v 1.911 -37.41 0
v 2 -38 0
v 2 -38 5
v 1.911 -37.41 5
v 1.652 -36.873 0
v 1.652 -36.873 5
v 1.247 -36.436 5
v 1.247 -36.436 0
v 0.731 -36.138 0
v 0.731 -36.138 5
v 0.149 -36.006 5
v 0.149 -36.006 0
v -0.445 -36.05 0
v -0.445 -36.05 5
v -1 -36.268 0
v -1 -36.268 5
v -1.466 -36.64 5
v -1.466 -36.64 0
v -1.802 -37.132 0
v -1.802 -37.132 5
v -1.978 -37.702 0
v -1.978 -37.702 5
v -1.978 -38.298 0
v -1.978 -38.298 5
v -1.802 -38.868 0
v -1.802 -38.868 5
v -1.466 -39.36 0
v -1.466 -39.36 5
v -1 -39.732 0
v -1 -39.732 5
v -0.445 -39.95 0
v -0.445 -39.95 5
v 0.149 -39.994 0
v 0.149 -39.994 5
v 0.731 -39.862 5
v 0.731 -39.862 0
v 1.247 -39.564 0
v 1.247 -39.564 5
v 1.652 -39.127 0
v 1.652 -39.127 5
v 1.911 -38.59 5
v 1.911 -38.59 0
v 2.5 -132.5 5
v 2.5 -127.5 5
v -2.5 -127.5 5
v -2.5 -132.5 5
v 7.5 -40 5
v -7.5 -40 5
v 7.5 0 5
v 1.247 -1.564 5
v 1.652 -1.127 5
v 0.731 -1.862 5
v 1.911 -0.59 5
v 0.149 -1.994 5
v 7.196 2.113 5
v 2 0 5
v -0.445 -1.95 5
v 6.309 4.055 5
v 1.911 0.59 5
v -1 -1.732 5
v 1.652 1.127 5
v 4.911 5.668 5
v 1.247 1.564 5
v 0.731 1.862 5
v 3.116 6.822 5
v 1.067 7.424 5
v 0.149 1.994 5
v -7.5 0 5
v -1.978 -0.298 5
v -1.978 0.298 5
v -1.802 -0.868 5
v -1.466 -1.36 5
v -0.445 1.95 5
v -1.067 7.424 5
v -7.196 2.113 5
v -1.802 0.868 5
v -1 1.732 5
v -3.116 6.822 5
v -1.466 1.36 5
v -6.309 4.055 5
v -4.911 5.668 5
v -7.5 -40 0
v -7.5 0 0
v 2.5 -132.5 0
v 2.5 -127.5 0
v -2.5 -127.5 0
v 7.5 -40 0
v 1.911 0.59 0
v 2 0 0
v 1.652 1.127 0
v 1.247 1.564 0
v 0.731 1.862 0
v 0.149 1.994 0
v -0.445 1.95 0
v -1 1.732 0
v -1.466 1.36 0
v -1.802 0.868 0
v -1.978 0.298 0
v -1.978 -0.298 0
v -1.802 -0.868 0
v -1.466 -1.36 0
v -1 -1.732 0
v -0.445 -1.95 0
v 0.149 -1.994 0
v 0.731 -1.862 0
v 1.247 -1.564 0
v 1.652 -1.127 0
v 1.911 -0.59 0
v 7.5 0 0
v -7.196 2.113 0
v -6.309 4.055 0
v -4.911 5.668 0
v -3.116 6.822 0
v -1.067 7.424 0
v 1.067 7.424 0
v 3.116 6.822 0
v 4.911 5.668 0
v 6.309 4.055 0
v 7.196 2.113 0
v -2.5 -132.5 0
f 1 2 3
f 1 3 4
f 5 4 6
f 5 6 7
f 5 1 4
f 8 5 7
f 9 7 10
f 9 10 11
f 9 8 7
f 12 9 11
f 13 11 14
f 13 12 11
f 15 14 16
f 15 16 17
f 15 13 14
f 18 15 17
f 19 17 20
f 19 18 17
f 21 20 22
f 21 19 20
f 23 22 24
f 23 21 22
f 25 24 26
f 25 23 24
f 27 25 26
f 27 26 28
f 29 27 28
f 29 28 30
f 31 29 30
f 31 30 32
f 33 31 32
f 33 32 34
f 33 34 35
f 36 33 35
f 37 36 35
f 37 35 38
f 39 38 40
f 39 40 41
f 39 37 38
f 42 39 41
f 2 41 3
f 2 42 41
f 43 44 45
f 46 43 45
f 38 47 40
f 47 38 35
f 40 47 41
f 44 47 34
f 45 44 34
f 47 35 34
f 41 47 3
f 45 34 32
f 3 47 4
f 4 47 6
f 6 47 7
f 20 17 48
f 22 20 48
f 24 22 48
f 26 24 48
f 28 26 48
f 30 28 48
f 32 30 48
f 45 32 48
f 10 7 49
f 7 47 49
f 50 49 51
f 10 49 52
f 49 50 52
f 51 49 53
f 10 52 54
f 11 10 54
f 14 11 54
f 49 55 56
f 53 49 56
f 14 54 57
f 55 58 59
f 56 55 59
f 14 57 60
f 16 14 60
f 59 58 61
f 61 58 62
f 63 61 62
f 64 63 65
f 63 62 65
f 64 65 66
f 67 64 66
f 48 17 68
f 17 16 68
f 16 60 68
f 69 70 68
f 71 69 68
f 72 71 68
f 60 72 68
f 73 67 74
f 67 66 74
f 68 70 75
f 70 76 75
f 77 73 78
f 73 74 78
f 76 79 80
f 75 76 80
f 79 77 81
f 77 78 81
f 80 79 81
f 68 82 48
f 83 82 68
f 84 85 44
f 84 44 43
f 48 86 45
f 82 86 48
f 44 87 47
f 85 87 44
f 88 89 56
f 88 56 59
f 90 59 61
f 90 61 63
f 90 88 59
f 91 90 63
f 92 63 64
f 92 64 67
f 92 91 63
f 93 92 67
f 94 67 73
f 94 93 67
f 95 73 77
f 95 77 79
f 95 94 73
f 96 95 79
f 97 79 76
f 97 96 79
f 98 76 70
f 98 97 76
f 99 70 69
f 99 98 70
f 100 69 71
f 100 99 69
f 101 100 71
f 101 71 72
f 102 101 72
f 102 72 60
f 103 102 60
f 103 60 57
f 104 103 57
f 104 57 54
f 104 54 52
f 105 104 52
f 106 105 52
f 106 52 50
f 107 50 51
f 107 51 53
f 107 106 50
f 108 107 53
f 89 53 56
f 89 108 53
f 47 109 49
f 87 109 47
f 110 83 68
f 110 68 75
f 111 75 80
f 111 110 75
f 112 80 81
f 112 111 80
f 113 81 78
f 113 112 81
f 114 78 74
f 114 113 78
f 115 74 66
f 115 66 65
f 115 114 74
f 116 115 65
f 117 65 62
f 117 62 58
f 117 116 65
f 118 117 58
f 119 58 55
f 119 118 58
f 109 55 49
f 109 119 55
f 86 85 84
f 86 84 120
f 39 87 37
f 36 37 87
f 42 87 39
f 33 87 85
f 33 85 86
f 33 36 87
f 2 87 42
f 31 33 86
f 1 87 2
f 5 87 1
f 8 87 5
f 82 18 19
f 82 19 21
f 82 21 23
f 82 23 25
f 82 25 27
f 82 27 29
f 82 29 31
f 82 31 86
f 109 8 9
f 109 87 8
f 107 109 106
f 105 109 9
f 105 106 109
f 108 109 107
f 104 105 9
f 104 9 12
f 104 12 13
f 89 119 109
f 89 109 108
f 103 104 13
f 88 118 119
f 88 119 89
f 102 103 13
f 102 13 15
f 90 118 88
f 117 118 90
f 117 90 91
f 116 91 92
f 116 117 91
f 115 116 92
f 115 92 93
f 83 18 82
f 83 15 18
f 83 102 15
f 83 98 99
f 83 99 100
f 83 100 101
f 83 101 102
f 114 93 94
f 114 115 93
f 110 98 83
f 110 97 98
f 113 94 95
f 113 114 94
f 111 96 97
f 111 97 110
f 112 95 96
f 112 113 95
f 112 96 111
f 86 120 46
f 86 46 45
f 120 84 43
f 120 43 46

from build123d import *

# Parameters (mm, degrees)
CROQUIS1_R              = 2
SALIENTE_EXTRUIR5_DEPTH = 5


with BuildPart() as part:
    # Croquis1 → Saliente-Extruir5 (new body)
    with BuildSketch(Plane.XY):
        with BuildLine():
            Line((-7.5, -40), (-7.5, 0))
            ThreePointArc((-7.5, 0), (0, 7.5), (7.5, 0))
            Line((7.5, 0), (7.5, -40))
            Line((7.5, -40), (2.499716416, -127.5))
            Line((2.499716416, -127.5), (2.499716416, -132.5))
            Line((2.499716416, -132.5), (-2.499716416, -132.5))
            Line((-2.499716416, -132.5), (-2.499716416, -127.5))
            Line((-2.499716416, -127.5), (-7.5, -40))
        make_face()
        with Locations((0, -38)):
            Circle(CROQUIS1_R, mode=Mode.SUBTRACT)
        Circle(CROQUIS1_R, mode=Mode.SUBTRACT)
    extrude(amount=SALIENTE_EXTRUIR5_DEPTH)


solid = part.part
